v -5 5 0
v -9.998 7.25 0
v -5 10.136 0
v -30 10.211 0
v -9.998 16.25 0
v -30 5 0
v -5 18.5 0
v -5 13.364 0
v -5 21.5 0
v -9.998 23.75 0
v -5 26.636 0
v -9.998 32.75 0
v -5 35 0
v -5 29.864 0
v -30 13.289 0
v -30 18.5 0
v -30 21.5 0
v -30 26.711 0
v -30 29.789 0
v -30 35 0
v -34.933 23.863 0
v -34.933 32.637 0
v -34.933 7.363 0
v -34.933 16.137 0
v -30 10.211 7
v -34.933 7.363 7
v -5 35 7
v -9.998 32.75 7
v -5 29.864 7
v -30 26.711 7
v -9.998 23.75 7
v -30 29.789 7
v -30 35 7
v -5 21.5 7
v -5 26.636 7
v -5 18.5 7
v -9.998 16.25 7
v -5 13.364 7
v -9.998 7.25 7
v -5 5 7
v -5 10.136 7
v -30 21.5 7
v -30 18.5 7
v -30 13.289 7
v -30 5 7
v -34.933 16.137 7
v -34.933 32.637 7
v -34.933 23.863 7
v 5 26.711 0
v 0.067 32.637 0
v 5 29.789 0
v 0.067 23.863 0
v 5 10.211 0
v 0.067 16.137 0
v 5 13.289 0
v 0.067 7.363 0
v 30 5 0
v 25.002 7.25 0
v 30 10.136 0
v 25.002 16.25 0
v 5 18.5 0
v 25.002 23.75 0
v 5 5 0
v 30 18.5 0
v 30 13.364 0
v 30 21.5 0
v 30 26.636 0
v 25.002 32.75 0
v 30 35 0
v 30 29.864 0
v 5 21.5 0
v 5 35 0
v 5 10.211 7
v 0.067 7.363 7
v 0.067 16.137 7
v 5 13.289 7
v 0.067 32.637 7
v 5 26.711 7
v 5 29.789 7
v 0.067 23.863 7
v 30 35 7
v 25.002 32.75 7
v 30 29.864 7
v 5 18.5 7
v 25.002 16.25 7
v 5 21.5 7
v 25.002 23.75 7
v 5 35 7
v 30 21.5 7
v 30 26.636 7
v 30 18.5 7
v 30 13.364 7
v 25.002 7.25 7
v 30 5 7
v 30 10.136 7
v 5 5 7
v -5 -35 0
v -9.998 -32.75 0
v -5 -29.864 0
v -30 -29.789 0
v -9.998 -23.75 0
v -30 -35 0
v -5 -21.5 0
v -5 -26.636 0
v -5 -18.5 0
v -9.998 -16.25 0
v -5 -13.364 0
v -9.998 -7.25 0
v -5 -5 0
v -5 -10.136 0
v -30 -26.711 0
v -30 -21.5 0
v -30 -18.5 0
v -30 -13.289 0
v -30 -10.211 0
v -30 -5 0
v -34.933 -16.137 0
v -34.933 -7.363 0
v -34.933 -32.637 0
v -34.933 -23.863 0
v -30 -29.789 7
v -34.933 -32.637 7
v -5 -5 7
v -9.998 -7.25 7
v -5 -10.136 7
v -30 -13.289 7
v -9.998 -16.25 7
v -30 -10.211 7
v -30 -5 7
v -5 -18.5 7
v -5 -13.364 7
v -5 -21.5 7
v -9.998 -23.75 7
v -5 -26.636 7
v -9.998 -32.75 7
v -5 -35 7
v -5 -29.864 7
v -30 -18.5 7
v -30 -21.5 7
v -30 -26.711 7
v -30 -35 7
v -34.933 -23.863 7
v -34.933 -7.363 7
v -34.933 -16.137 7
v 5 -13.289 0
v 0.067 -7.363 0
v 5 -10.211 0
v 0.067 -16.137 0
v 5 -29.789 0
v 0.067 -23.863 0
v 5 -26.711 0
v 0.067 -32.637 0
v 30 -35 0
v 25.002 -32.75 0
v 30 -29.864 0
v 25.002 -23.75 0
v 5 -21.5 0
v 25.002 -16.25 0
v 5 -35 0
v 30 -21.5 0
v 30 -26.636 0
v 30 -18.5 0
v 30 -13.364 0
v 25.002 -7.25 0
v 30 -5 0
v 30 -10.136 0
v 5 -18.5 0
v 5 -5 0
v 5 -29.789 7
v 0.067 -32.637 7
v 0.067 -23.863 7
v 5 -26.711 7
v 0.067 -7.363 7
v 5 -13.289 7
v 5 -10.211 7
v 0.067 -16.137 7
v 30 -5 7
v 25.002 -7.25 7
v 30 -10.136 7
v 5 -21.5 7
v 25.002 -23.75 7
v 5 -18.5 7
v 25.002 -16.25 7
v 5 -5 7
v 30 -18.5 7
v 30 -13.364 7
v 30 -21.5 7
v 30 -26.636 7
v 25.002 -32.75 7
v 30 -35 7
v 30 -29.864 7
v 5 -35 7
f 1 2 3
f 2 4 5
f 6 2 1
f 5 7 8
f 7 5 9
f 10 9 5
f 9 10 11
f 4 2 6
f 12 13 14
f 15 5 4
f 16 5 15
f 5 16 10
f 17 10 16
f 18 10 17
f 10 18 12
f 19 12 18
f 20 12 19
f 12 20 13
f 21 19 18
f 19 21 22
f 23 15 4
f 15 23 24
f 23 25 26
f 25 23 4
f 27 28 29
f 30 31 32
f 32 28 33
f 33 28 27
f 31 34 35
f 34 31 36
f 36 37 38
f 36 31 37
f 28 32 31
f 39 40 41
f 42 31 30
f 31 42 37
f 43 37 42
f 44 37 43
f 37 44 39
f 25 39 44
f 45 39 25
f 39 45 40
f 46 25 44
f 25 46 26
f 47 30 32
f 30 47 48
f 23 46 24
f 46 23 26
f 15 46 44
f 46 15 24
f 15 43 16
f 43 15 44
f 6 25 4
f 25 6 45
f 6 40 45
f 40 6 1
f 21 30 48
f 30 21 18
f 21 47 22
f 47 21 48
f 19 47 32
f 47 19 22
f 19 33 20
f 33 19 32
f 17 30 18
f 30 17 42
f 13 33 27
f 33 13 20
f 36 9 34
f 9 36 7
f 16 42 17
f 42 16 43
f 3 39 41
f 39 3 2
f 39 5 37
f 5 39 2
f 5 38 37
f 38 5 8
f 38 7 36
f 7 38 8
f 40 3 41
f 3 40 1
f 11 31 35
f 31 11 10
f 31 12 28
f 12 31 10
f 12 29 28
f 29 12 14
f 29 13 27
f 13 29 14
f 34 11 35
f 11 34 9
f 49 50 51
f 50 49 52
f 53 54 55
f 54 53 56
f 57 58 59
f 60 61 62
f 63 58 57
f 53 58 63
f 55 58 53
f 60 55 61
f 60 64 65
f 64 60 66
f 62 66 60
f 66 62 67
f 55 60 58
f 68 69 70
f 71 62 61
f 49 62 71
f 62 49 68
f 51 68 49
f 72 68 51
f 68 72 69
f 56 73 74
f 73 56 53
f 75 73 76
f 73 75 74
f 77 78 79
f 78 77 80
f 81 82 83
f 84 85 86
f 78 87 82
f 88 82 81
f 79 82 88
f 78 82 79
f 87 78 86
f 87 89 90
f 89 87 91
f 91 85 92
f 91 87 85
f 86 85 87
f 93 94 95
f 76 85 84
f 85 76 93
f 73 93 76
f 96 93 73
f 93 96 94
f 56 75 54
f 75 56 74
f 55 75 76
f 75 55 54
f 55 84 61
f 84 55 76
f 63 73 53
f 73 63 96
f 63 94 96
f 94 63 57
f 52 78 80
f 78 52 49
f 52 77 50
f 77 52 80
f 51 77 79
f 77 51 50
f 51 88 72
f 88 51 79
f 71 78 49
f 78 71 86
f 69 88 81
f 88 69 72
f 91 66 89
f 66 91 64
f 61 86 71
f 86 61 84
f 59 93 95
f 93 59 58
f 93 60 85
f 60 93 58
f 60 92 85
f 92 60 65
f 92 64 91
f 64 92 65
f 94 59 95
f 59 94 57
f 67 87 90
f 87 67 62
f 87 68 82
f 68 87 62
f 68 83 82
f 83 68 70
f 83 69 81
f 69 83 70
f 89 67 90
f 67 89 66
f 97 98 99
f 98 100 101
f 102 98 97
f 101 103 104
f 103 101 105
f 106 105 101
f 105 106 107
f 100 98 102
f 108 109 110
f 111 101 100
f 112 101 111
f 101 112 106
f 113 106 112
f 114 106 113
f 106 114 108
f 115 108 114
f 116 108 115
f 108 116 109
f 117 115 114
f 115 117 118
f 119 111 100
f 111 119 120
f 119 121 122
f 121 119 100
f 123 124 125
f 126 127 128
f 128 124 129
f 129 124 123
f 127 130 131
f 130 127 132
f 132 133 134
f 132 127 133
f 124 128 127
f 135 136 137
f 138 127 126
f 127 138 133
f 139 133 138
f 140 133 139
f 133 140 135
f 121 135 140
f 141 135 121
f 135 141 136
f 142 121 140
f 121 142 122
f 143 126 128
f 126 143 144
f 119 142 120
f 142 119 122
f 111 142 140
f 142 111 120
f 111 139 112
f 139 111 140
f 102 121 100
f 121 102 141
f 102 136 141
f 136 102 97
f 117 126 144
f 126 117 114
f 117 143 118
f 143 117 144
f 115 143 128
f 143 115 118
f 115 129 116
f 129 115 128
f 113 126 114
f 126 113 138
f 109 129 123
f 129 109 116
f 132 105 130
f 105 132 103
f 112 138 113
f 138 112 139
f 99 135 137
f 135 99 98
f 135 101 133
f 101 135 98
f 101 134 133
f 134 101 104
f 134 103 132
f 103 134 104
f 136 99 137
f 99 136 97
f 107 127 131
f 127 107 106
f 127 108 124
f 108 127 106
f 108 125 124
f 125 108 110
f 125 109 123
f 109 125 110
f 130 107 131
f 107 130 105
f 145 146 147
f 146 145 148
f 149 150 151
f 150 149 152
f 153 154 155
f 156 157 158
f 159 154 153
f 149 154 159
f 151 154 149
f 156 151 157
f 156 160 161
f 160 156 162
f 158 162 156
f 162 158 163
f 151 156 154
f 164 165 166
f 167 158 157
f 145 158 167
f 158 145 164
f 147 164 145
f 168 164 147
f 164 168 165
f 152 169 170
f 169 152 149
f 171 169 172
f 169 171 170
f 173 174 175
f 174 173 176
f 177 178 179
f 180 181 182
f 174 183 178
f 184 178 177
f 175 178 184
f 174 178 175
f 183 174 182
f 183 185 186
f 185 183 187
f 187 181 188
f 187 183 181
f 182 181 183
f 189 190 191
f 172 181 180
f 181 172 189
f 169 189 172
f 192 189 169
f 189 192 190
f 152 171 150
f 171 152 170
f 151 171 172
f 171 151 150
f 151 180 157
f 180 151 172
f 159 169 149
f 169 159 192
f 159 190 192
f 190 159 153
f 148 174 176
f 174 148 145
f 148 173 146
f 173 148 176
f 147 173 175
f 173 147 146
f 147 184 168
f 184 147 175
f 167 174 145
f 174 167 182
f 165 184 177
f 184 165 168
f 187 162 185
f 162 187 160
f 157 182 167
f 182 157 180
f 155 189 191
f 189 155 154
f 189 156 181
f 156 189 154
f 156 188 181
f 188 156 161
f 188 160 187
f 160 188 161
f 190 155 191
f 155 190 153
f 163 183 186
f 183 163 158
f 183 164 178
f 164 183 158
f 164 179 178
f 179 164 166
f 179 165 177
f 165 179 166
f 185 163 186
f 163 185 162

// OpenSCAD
// file: mcad/units.scad
/*
 * Basic units.
 *
 * Originally by Hans Häggström, 2010.
 * Dual licenced under Creative Commons Attribution-Share Alike 3.0 and LGPL2 or later
 */


mm = 1;
cm = 10 * mm;
dm = 100 * mm;
m = 1000 * mm;

inch = 25.4 * mm;

X = [1, 0, 0];
Y = [0, 1, 0];
Z = [0, 0, 1];

M3 = 3*mm;
M4 = 4*mm;
M5 = 5*mm;
M6 = 6*mm;
M8 = 8*mm;


// When a small distance is needed to overlap shapes for boolean cutting, etc.
epsilon = 0.01*mm;

phi=0.5*(sqrt(5) + 1 );
// file: ss_parms.scad
/*
 * Parameters for SugarSnap RepRap 
 *  Copyright (C) 2011  Adam Milner
 *
 *  This program is free software; you can redistribute it and/or modify
 *  it under the terms of the GNU General Public License as published by
 *  the Free Software Foundation; either version 2 of the License, or
 *  (at your option) any later version.
 *
 *  This program is distributed in the hope that it will be useful,
 *  but WITHOUT ANY WARRANTY; without even the implied warranty of
 *  MERCHANTABILITY or FITNESS FOR A PARTICULAR PURPOSE.  See the
 *  GNU General Public License for more details.
 *
 *  You should have received a copy of the GNU General Public License
 *  along with this program; if not, write to the Free Software
 *  Foundation, Inc., 59 Temple Place, Suite 330, Boston, MA  02111-1307  USA
 *
*/

include <mcad/units.scad>

/*** Primary Configuration ***/
rod_diameter = (3/8) * inch; // outer diamter of the smooth rods
rod_length = 12 * inch; // length of the smooth rods
rod_tol = 0.15; // tolerance added to rod holes for shrinkage

/*** End Struts ***/
es_length = 80; // strut body length
es_width = 30;	// strut body width
es_height = 7; // strut body thickness
es_teardrops = true; // include teardrop holes
es_td_radius = 9; // teardrop hole radius
es_num_td = 2;	// number of teardrops
es_td_space = 12; // space between teardrops 

/*** Base Struts ***/
bs_length = 50; // strut body length
bs_width = 30;	// strut body width
bs_height = 7; // strut body thickness
bs_teardrops = true; // include teardrop holes
bs_td_radius = 9; // teardrop hole radius
bs_num_td = 1;	// number of teardrops
bs_td_space = 12; // space between teardrops 

/*** Y Rod Support Struts ***/
ys_length = 30; // strut body length
ys_width = bs_width;	// strut body width
ys_height = bs_height; // strut body thickness
ys_foot = true;	// use a foot on the y rod support
ys_foot_width = 8;	// foot width
ys_rod_diameter = rod_diameter; // outer diameter of the y-rod, plus some shrinkage
ys_rod_wall = 3;
ys_rod_length = 15;
ys_rod_tol = rod_tol;
ys_rod_sink = ys_height / 2; //rod countersink into the body 

/*** Y Motor Strut Struts ***/
ym_length = 100; // strut body length
ym_width = bs_width;	// strut body width
ym_height = bs_height ; // strut body thickness

/*** Bottom Vertex ***/
bv_width = es_height; // vertex thickness
bv_radius = 31; // radius of the vertex
bs_sink = es_height/3; // how far to countersink the y supporting base struts into the vertex
bs_outset = 10; // outset of the y supporting base struts from the center of the vertex
bv_tolerance = 0.45; // shrinkage tolerence for the strut slots

/*** Top Vertex ***/
tv_rod_diameter = ys_rod_diameter; // outer diameter of the x-rod, plus some shrinkage
tv_rod_wall = ys_rod_wall;
tv_rod_length = ys_rod_length;
tv_rod_spacing = 35; // space between the inside edges of the x-rods
tv_rod_lift = 0; // center of x rods above center of vertex semi-circle
tv_top_height = tv_rod_diameter/2 + tv_rod_wall + tv_rod_lift + 5; // vertex body height above bottom half circle
tv_rod_sink = es_height/2;
tv_rod_tol = rod_tol;

/*** X Motor Mount ***/
x_dt_space = 20; // spacing between the X motor mount dovetails

/*** Y Carriage ***/
yc_width = ym_length + 2 * ys_length; // width (x direction) of the y carriage
yc_length = 90; // length in the y direction of the y carriage
yc_thick = 5; // thickness of the Y carriage frame pieces
yc_frame_width = 25; // width of the Y carriage frame pieces
yc_thickness = 5; // thickness of the Y carriage frame pieces
yc_platform_mount_height = 5; // height of the build platform  mounts above the Y carriage
yc_platform_mount_diameter = yc_frame_width; // diameter of the build platform mounts
yc_magnet_diameter = 5; // diameter of the build platform mounting magnets
yc_magnet_thickness = 3; // thickness of the build platform mounting magnets
// main file
include <Libs.scad> 
include <ss_parms.scad>

libEcho=false;
rod_test = false;

translate([-30,5,0])
	dt_test(0.950);
	
translate([5,5,0])
	dt_test(0.925);

translate([-30,-35,0])
	dt_test(0.900);

translate([5,-35,0])
	dt_test(0.875);
	
	
module dt_test(scale = 0.975){
		difference(){
			union(){
				cube(size=[25, ys_width, ys_height]);
				translate([0, 6.75, ys_height/2]) mirror([1,0,0]) 
					dovetail(male = true, height = ys_height, fit_scale = scale);
				translate([0,  ys_width - 6.75, ys_height/2]) mirror([1,0,0]) 
					dovetail(male = true, height = ys_height, fit_scale = scale);
	
				if (rod_test){
					translate([25 / 2, ys_width / 2, ys_height + ys_rod_length / 2])
						difference(){
							cylinder(r=ys_rod_diameter / 2 + ys_rod_wall, h=ys_rod_length+ 0.01, center=true, $fn=resolution(ys_rod_diameter));  
							cylinder(r=ys_rod_diameter / 2, h=ys_rod_length + 0.1, center=true, $fn=resolution(ys_rod_diameter));  
						}
				}
			}
			translate([25, 6.75, ys_height/2]) 
				mirror([1,0,0])
					dovetail(male = false, height = ys_height+ 0.01);
			translate([25,  ys_width - 6.75, ys_height/2]) 
				mirror([1,0,0])
					dovetail(male = false, height = ys_height+ 0.01);
		}
}
